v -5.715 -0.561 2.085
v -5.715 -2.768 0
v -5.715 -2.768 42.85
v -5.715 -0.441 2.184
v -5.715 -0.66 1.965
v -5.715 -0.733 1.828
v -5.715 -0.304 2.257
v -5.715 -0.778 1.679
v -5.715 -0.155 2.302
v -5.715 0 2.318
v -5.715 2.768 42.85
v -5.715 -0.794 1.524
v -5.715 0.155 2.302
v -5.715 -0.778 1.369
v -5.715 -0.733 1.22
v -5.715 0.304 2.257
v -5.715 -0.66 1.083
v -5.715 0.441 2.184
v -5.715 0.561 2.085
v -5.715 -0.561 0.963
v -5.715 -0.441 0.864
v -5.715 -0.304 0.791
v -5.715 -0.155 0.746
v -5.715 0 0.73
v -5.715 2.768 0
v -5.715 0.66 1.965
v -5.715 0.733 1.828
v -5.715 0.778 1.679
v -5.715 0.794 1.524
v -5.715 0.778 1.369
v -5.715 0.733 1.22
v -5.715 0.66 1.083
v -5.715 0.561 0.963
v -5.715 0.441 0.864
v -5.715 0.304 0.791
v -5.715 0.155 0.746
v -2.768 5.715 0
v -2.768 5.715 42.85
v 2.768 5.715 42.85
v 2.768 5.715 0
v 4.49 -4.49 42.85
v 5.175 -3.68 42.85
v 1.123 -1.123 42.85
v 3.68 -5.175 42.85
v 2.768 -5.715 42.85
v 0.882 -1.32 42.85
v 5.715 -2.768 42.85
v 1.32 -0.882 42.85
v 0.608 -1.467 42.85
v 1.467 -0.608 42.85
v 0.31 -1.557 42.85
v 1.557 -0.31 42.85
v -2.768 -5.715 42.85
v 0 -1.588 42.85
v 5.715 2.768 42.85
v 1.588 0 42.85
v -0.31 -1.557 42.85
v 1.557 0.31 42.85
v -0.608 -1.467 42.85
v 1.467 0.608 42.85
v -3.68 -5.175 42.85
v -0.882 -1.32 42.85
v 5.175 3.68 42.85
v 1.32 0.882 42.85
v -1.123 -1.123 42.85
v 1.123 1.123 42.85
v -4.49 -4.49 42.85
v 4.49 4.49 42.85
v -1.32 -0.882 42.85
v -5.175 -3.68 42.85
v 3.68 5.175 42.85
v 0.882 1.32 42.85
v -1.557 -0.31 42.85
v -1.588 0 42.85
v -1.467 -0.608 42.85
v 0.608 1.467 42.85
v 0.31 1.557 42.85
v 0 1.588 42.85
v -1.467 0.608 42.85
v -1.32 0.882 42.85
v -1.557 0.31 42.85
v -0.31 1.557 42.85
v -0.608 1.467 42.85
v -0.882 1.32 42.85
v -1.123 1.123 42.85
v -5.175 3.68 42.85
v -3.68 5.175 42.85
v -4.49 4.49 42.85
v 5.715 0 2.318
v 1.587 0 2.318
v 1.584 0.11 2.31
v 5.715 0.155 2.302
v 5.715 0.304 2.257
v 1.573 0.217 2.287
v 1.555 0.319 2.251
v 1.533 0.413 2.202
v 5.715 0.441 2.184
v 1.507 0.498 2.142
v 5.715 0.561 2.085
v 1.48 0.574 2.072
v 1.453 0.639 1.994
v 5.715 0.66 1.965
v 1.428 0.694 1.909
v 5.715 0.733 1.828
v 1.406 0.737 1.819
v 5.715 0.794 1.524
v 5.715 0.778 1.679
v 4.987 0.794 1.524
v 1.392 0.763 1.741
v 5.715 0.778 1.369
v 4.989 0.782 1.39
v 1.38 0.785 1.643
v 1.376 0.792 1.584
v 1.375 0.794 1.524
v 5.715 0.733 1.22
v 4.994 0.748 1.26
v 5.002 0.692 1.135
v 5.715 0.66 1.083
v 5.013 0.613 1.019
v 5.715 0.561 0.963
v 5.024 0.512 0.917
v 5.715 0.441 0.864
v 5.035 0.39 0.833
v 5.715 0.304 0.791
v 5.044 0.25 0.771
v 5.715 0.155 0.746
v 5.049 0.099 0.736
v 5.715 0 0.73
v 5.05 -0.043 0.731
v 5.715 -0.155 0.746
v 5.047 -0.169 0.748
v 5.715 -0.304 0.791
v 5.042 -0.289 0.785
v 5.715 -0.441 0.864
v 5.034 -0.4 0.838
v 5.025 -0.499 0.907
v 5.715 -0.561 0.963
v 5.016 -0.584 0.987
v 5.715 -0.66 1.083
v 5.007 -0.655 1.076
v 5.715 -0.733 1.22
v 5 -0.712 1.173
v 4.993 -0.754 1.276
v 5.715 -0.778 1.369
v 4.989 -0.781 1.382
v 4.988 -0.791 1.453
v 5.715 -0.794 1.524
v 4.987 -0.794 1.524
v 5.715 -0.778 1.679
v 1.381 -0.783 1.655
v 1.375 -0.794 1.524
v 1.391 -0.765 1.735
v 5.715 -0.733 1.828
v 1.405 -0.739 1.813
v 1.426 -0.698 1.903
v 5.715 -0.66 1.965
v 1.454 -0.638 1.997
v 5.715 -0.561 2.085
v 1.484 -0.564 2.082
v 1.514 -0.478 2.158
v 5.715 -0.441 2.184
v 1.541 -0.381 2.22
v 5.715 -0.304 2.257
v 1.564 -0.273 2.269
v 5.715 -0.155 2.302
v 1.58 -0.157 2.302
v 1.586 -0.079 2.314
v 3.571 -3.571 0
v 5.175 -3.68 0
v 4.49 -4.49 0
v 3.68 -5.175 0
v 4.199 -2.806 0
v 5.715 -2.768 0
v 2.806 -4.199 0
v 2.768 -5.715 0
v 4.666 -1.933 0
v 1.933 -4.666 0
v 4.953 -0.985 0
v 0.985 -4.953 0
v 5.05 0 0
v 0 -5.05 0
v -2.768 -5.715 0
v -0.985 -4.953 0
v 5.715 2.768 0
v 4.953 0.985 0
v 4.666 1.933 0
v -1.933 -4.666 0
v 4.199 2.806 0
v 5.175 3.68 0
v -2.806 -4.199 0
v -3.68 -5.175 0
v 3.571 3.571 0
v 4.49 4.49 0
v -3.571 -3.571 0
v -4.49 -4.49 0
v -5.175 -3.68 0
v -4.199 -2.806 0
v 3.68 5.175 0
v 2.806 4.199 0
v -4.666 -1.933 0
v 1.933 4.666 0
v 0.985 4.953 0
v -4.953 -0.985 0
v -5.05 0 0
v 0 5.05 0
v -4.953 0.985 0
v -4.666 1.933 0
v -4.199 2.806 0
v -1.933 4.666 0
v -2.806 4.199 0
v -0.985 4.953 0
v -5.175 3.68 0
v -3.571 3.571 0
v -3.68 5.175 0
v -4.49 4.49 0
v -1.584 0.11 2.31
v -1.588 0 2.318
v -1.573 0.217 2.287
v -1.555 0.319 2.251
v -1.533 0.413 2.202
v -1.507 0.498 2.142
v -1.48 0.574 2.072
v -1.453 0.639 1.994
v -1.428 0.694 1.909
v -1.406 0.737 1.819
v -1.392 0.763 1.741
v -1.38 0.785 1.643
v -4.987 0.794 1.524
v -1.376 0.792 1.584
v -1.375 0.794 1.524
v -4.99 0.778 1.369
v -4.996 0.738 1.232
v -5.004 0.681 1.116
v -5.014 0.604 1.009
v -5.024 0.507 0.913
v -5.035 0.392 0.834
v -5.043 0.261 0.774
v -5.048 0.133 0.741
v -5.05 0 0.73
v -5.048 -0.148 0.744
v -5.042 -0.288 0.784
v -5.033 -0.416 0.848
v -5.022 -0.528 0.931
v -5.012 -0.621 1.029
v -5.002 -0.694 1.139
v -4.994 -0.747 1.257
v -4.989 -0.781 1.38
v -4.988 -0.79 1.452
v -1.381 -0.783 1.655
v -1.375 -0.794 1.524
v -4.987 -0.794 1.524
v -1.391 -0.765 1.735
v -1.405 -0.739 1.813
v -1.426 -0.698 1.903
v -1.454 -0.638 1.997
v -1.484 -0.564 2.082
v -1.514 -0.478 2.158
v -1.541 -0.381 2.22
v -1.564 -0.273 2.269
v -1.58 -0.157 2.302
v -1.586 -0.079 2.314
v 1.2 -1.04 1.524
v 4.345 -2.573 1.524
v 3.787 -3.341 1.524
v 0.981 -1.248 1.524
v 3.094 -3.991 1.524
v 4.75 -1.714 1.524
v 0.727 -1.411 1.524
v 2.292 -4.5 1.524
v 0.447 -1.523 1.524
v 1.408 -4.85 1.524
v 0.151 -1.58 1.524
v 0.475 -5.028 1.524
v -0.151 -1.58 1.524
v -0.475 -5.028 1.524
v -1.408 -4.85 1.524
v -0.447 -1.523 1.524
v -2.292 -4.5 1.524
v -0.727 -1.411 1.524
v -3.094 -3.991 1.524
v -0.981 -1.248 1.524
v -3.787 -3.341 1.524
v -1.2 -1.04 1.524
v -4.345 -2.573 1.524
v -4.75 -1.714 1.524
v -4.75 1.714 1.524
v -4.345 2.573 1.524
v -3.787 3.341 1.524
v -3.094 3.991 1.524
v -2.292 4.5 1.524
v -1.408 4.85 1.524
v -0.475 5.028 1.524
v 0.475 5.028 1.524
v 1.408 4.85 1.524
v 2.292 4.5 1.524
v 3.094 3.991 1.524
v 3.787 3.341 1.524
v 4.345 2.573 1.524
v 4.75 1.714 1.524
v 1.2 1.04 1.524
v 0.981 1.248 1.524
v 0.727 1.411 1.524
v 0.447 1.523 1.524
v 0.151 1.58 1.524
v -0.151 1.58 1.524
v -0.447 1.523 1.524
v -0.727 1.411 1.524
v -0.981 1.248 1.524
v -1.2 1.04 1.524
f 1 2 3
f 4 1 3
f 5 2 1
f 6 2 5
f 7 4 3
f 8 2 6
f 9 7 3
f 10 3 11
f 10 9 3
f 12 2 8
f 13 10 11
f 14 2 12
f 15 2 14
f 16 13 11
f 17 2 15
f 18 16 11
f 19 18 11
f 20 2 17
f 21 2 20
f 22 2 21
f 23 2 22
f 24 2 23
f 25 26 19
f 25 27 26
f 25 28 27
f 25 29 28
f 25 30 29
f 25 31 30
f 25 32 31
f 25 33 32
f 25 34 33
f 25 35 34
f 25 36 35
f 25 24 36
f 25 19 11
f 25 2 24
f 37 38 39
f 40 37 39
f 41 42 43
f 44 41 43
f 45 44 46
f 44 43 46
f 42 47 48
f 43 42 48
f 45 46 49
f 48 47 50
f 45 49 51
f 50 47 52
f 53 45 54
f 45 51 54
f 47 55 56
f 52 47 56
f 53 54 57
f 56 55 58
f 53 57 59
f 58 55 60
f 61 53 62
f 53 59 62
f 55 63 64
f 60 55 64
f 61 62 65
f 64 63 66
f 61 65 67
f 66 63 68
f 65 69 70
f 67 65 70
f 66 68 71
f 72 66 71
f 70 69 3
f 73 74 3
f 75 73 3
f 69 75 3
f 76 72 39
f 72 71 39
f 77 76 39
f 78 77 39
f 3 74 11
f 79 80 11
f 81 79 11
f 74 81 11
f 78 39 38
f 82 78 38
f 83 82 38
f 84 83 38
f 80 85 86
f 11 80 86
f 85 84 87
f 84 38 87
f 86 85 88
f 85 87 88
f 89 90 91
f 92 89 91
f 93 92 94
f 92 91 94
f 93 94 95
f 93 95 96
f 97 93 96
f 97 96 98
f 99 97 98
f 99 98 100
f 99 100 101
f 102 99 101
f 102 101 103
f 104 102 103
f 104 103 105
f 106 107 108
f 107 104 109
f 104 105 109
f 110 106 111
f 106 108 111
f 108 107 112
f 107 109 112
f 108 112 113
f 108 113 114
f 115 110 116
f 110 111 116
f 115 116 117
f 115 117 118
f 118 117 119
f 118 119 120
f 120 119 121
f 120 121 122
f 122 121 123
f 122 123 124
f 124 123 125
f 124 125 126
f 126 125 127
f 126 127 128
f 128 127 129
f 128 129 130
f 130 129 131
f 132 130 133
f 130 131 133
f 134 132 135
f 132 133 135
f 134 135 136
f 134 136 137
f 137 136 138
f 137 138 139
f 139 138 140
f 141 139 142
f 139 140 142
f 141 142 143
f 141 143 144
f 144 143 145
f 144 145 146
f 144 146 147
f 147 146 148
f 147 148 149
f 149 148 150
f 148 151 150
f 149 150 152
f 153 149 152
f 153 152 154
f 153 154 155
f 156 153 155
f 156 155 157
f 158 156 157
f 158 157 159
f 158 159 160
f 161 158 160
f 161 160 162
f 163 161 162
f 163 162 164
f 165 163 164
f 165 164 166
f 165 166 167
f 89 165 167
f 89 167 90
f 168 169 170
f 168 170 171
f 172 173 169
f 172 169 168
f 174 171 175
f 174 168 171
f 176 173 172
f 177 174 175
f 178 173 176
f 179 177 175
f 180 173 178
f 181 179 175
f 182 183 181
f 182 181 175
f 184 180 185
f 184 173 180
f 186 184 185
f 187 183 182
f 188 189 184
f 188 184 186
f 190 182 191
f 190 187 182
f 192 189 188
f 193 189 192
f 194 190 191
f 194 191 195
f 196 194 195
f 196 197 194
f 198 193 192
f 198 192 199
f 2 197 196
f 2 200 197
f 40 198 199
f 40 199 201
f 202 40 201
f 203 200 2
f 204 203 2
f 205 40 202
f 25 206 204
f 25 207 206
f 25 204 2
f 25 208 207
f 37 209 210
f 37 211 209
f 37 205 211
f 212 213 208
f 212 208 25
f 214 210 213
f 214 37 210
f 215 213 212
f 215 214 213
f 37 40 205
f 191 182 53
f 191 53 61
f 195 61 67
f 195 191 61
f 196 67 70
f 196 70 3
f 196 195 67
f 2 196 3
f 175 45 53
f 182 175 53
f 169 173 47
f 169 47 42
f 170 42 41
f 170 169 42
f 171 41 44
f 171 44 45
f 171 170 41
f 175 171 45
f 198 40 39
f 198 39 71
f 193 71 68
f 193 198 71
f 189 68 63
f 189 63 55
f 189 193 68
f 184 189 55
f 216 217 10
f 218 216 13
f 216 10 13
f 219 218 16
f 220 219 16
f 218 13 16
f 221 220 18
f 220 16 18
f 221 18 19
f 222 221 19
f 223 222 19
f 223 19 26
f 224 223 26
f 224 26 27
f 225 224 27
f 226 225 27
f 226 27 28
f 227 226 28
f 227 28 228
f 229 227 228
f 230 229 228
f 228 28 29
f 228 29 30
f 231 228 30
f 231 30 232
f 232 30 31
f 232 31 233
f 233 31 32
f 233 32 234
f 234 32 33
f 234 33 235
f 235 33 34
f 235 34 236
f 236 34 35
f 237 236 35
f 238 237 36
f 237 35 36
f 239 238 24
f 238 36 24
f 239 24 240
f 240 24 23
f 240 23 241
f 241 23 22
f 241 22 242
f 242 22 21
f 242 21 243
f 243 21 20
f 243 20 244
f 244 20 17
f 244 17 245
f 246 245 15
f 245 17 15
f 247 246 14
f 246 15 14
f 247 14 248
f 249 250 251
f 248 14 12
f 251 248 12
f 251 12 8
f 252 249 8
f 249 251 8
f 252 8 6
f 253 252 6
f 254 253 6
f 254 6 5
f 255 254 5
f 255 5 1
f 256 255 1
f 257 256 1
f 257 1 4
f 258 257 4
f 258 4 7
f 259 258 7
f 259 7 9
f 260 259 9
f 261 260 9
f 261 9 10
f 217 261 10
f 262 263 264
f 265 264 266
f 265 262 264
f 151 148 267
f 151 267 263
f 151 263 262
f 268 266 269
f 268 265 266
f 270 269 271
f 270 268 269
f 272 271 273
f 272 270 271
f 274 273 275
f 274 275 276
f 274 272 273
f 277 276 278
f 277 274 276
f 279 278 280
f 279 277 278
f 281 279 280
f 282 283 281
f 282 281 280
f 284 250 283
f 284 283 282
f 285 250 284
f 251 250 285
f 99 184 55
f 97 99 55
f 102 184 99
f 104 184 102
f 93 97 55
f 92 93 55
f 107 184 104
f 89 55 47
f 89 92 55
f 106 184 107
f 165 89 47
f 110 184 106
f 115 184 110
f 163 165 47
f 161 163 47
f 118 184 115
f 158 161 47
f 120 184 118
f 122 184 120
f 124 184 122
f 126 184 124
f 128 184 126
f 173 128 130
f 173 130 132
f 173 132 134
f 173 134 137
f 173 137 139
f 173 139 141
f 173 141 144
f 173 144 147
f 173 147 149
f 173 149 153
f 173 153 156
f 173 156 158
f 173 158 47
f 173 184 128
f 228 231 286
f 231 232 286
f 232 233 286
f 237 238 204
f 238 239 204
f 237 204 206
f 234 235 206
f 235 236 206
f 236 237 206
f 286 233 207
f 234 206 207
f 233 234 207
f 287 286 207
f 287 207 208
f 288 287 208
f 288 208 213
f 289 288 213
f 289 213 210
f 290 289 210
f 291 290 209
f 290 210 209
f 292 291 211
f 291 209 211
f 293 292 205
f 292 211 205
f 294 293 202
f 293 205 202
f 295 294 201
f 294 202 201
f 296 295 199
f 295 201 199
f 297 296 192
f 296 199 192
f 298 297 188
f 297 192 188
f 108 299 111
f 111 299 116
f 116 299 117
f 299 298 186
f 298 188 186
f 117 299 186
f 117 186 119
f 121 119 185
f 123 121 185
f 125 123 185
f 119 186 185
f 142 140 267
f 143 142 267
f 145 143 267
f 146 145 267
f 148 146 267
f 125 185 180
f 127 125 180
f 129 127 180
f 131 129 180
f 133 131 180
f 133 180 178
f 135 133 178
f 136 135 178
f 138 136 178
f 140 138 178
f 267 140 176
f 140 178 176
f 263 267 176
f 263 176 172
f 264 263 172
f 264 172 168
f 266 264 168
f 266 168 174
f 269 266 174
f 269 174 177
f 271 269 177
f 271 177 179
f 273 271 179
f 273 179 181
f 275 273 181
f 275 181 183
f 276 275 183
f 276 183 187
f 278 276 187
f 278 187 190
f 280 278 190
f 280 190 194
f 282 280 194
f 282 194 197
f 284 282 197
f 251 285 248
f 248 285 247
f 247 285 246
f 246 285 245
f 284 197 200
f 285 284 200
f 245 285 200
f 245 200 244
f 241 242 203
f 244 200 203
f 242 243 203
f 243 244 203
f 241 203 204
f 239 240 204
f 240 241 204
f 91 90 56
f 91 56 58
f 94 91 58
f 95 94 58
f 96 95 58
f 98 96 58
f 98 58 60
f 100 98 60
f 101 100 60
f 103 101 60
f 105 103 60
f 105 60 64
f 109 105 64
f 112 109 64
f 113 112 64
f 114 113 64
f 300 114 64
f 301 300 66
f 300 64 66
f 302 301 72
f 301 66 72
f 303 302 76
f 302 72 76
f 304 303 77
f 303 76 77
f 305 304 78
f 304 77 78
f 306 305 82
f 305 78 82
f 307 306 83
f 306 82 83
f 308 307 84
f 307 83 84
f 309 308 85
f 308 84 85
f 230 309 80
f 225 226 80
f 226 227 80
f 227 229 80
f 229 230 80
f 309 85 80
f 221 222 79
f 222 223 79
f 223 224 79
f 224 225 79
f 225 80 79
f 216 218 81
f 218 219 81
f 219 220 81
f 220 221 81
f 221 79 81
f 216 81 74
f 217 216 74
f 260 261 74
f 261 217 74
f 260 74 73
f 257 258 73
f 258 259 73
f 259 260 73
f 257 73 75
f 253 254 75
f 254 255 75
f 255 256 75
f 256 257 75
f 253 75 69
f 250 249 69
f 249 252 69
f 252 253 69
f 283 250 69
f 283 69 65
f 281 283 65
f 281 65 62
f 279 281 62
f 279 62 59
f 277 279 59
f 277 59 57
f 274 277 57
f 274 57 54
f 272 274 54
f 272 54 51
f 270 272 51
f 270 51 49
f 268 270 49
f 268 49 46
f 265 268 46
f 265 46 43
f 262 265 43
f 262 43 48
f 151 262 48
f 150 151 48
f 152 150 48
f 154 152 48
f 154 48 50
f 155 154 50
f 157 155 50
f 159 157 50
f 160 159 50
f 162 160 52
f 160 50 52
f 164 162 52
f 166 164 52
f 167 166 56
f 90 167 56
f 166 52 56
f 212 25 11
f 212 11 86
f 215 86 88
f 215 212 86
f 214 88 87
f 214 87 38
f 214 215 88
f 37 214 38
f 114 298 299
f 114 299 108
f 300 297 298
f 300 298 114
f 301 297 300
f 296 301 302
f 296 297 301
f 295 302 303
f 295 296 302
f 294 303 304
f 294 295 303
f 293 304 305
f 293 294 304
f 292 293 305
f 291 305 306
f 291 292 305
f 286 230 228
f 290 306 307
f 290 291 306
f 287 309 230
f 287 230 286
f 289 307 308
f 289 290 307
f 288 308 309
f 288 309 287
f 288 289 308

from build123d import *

# Parameters (mm, degrees)
BOSS_EXTRUDE1_DEPTH            = 42.8498
SKETCH4_R                      = 5.05
CUT_EXTRUDE1_DEPTH             = 1.524
F_1_16_0_0625_DIAMETER_HOLE1_D = 1.5875
F_1_8_0_125_DIAMETER_HOLE2_D   = 3.175


with BuildPart() as part:
    # Sketch1 → Boss-Extrude1 (new body)
    with BuildSketch(Plane.XY):
        with BuildLine():
            Line((-2.767900829, 5.715), (2.767900829, 5.715))
            ThreePointArc((2.767900829, 5.715), (4.490128061, 4.490128061), (5.715, 2.767900829))
            Line((5.715, 2.767900829), (5.715, -2.767900829))
            ThreePointArc((5.715, -2.767900829), (4.490128061, -4.490128061), (2.767900829, -5.715))
            Line((2.767900829, -5.715), (-2.767900829, -5.715))
            ThreePointArc((-2.767900829, -5.715), (-4.490128061, -4.490128061), (-5.715, -2.767900829))
            Line((-5.715, -2.767900829), (-5.715, 2.767900829))
            ThreePointArc((-5.715, 2.767900829), (-4.490128061, 4.490128061), (-2.767900829, 5.715))
        make_face()
    extrude(amount=BOSS_EXTRUDE1_DEPTH)

    # Sketch4 → Cut-Extrude1 (cut)
    with BuildSketch(Plane(origin=(0, 0, 0), x_dir=(-1, 0, 0), z_dir=(0, 0, -1))):
        Circle(SKETCH4_R)
    extrude(amount=-CUT_EXTRUDE1_DEPTH, mode=Mode.SUBTRACT)

    # 1/16 (0.0625) Diameter Hole1 (through all)
    with Locations(Plane(origin=(5.715, 0, 0), x_dir=(0, 0, -1), z_dir=(1, 0, 0))):
        with Locations((-1.524, 0)):
            Hole(F_1_16_0_0625_DIAMETER_HOLE1_D / 2)

    # 1/8 (0.125) Diameter Hole2 (through all)
    with Locations(Plane(origin=(0, 0, 1.524), x_dir=(-1, 0, 0), z_dir=(0, 0, -1))):
        with Locations((0, 0)):
            Hole(F_1_8_0_125_DIAMETER_HOLE2_D / 2)


solid = part.part
